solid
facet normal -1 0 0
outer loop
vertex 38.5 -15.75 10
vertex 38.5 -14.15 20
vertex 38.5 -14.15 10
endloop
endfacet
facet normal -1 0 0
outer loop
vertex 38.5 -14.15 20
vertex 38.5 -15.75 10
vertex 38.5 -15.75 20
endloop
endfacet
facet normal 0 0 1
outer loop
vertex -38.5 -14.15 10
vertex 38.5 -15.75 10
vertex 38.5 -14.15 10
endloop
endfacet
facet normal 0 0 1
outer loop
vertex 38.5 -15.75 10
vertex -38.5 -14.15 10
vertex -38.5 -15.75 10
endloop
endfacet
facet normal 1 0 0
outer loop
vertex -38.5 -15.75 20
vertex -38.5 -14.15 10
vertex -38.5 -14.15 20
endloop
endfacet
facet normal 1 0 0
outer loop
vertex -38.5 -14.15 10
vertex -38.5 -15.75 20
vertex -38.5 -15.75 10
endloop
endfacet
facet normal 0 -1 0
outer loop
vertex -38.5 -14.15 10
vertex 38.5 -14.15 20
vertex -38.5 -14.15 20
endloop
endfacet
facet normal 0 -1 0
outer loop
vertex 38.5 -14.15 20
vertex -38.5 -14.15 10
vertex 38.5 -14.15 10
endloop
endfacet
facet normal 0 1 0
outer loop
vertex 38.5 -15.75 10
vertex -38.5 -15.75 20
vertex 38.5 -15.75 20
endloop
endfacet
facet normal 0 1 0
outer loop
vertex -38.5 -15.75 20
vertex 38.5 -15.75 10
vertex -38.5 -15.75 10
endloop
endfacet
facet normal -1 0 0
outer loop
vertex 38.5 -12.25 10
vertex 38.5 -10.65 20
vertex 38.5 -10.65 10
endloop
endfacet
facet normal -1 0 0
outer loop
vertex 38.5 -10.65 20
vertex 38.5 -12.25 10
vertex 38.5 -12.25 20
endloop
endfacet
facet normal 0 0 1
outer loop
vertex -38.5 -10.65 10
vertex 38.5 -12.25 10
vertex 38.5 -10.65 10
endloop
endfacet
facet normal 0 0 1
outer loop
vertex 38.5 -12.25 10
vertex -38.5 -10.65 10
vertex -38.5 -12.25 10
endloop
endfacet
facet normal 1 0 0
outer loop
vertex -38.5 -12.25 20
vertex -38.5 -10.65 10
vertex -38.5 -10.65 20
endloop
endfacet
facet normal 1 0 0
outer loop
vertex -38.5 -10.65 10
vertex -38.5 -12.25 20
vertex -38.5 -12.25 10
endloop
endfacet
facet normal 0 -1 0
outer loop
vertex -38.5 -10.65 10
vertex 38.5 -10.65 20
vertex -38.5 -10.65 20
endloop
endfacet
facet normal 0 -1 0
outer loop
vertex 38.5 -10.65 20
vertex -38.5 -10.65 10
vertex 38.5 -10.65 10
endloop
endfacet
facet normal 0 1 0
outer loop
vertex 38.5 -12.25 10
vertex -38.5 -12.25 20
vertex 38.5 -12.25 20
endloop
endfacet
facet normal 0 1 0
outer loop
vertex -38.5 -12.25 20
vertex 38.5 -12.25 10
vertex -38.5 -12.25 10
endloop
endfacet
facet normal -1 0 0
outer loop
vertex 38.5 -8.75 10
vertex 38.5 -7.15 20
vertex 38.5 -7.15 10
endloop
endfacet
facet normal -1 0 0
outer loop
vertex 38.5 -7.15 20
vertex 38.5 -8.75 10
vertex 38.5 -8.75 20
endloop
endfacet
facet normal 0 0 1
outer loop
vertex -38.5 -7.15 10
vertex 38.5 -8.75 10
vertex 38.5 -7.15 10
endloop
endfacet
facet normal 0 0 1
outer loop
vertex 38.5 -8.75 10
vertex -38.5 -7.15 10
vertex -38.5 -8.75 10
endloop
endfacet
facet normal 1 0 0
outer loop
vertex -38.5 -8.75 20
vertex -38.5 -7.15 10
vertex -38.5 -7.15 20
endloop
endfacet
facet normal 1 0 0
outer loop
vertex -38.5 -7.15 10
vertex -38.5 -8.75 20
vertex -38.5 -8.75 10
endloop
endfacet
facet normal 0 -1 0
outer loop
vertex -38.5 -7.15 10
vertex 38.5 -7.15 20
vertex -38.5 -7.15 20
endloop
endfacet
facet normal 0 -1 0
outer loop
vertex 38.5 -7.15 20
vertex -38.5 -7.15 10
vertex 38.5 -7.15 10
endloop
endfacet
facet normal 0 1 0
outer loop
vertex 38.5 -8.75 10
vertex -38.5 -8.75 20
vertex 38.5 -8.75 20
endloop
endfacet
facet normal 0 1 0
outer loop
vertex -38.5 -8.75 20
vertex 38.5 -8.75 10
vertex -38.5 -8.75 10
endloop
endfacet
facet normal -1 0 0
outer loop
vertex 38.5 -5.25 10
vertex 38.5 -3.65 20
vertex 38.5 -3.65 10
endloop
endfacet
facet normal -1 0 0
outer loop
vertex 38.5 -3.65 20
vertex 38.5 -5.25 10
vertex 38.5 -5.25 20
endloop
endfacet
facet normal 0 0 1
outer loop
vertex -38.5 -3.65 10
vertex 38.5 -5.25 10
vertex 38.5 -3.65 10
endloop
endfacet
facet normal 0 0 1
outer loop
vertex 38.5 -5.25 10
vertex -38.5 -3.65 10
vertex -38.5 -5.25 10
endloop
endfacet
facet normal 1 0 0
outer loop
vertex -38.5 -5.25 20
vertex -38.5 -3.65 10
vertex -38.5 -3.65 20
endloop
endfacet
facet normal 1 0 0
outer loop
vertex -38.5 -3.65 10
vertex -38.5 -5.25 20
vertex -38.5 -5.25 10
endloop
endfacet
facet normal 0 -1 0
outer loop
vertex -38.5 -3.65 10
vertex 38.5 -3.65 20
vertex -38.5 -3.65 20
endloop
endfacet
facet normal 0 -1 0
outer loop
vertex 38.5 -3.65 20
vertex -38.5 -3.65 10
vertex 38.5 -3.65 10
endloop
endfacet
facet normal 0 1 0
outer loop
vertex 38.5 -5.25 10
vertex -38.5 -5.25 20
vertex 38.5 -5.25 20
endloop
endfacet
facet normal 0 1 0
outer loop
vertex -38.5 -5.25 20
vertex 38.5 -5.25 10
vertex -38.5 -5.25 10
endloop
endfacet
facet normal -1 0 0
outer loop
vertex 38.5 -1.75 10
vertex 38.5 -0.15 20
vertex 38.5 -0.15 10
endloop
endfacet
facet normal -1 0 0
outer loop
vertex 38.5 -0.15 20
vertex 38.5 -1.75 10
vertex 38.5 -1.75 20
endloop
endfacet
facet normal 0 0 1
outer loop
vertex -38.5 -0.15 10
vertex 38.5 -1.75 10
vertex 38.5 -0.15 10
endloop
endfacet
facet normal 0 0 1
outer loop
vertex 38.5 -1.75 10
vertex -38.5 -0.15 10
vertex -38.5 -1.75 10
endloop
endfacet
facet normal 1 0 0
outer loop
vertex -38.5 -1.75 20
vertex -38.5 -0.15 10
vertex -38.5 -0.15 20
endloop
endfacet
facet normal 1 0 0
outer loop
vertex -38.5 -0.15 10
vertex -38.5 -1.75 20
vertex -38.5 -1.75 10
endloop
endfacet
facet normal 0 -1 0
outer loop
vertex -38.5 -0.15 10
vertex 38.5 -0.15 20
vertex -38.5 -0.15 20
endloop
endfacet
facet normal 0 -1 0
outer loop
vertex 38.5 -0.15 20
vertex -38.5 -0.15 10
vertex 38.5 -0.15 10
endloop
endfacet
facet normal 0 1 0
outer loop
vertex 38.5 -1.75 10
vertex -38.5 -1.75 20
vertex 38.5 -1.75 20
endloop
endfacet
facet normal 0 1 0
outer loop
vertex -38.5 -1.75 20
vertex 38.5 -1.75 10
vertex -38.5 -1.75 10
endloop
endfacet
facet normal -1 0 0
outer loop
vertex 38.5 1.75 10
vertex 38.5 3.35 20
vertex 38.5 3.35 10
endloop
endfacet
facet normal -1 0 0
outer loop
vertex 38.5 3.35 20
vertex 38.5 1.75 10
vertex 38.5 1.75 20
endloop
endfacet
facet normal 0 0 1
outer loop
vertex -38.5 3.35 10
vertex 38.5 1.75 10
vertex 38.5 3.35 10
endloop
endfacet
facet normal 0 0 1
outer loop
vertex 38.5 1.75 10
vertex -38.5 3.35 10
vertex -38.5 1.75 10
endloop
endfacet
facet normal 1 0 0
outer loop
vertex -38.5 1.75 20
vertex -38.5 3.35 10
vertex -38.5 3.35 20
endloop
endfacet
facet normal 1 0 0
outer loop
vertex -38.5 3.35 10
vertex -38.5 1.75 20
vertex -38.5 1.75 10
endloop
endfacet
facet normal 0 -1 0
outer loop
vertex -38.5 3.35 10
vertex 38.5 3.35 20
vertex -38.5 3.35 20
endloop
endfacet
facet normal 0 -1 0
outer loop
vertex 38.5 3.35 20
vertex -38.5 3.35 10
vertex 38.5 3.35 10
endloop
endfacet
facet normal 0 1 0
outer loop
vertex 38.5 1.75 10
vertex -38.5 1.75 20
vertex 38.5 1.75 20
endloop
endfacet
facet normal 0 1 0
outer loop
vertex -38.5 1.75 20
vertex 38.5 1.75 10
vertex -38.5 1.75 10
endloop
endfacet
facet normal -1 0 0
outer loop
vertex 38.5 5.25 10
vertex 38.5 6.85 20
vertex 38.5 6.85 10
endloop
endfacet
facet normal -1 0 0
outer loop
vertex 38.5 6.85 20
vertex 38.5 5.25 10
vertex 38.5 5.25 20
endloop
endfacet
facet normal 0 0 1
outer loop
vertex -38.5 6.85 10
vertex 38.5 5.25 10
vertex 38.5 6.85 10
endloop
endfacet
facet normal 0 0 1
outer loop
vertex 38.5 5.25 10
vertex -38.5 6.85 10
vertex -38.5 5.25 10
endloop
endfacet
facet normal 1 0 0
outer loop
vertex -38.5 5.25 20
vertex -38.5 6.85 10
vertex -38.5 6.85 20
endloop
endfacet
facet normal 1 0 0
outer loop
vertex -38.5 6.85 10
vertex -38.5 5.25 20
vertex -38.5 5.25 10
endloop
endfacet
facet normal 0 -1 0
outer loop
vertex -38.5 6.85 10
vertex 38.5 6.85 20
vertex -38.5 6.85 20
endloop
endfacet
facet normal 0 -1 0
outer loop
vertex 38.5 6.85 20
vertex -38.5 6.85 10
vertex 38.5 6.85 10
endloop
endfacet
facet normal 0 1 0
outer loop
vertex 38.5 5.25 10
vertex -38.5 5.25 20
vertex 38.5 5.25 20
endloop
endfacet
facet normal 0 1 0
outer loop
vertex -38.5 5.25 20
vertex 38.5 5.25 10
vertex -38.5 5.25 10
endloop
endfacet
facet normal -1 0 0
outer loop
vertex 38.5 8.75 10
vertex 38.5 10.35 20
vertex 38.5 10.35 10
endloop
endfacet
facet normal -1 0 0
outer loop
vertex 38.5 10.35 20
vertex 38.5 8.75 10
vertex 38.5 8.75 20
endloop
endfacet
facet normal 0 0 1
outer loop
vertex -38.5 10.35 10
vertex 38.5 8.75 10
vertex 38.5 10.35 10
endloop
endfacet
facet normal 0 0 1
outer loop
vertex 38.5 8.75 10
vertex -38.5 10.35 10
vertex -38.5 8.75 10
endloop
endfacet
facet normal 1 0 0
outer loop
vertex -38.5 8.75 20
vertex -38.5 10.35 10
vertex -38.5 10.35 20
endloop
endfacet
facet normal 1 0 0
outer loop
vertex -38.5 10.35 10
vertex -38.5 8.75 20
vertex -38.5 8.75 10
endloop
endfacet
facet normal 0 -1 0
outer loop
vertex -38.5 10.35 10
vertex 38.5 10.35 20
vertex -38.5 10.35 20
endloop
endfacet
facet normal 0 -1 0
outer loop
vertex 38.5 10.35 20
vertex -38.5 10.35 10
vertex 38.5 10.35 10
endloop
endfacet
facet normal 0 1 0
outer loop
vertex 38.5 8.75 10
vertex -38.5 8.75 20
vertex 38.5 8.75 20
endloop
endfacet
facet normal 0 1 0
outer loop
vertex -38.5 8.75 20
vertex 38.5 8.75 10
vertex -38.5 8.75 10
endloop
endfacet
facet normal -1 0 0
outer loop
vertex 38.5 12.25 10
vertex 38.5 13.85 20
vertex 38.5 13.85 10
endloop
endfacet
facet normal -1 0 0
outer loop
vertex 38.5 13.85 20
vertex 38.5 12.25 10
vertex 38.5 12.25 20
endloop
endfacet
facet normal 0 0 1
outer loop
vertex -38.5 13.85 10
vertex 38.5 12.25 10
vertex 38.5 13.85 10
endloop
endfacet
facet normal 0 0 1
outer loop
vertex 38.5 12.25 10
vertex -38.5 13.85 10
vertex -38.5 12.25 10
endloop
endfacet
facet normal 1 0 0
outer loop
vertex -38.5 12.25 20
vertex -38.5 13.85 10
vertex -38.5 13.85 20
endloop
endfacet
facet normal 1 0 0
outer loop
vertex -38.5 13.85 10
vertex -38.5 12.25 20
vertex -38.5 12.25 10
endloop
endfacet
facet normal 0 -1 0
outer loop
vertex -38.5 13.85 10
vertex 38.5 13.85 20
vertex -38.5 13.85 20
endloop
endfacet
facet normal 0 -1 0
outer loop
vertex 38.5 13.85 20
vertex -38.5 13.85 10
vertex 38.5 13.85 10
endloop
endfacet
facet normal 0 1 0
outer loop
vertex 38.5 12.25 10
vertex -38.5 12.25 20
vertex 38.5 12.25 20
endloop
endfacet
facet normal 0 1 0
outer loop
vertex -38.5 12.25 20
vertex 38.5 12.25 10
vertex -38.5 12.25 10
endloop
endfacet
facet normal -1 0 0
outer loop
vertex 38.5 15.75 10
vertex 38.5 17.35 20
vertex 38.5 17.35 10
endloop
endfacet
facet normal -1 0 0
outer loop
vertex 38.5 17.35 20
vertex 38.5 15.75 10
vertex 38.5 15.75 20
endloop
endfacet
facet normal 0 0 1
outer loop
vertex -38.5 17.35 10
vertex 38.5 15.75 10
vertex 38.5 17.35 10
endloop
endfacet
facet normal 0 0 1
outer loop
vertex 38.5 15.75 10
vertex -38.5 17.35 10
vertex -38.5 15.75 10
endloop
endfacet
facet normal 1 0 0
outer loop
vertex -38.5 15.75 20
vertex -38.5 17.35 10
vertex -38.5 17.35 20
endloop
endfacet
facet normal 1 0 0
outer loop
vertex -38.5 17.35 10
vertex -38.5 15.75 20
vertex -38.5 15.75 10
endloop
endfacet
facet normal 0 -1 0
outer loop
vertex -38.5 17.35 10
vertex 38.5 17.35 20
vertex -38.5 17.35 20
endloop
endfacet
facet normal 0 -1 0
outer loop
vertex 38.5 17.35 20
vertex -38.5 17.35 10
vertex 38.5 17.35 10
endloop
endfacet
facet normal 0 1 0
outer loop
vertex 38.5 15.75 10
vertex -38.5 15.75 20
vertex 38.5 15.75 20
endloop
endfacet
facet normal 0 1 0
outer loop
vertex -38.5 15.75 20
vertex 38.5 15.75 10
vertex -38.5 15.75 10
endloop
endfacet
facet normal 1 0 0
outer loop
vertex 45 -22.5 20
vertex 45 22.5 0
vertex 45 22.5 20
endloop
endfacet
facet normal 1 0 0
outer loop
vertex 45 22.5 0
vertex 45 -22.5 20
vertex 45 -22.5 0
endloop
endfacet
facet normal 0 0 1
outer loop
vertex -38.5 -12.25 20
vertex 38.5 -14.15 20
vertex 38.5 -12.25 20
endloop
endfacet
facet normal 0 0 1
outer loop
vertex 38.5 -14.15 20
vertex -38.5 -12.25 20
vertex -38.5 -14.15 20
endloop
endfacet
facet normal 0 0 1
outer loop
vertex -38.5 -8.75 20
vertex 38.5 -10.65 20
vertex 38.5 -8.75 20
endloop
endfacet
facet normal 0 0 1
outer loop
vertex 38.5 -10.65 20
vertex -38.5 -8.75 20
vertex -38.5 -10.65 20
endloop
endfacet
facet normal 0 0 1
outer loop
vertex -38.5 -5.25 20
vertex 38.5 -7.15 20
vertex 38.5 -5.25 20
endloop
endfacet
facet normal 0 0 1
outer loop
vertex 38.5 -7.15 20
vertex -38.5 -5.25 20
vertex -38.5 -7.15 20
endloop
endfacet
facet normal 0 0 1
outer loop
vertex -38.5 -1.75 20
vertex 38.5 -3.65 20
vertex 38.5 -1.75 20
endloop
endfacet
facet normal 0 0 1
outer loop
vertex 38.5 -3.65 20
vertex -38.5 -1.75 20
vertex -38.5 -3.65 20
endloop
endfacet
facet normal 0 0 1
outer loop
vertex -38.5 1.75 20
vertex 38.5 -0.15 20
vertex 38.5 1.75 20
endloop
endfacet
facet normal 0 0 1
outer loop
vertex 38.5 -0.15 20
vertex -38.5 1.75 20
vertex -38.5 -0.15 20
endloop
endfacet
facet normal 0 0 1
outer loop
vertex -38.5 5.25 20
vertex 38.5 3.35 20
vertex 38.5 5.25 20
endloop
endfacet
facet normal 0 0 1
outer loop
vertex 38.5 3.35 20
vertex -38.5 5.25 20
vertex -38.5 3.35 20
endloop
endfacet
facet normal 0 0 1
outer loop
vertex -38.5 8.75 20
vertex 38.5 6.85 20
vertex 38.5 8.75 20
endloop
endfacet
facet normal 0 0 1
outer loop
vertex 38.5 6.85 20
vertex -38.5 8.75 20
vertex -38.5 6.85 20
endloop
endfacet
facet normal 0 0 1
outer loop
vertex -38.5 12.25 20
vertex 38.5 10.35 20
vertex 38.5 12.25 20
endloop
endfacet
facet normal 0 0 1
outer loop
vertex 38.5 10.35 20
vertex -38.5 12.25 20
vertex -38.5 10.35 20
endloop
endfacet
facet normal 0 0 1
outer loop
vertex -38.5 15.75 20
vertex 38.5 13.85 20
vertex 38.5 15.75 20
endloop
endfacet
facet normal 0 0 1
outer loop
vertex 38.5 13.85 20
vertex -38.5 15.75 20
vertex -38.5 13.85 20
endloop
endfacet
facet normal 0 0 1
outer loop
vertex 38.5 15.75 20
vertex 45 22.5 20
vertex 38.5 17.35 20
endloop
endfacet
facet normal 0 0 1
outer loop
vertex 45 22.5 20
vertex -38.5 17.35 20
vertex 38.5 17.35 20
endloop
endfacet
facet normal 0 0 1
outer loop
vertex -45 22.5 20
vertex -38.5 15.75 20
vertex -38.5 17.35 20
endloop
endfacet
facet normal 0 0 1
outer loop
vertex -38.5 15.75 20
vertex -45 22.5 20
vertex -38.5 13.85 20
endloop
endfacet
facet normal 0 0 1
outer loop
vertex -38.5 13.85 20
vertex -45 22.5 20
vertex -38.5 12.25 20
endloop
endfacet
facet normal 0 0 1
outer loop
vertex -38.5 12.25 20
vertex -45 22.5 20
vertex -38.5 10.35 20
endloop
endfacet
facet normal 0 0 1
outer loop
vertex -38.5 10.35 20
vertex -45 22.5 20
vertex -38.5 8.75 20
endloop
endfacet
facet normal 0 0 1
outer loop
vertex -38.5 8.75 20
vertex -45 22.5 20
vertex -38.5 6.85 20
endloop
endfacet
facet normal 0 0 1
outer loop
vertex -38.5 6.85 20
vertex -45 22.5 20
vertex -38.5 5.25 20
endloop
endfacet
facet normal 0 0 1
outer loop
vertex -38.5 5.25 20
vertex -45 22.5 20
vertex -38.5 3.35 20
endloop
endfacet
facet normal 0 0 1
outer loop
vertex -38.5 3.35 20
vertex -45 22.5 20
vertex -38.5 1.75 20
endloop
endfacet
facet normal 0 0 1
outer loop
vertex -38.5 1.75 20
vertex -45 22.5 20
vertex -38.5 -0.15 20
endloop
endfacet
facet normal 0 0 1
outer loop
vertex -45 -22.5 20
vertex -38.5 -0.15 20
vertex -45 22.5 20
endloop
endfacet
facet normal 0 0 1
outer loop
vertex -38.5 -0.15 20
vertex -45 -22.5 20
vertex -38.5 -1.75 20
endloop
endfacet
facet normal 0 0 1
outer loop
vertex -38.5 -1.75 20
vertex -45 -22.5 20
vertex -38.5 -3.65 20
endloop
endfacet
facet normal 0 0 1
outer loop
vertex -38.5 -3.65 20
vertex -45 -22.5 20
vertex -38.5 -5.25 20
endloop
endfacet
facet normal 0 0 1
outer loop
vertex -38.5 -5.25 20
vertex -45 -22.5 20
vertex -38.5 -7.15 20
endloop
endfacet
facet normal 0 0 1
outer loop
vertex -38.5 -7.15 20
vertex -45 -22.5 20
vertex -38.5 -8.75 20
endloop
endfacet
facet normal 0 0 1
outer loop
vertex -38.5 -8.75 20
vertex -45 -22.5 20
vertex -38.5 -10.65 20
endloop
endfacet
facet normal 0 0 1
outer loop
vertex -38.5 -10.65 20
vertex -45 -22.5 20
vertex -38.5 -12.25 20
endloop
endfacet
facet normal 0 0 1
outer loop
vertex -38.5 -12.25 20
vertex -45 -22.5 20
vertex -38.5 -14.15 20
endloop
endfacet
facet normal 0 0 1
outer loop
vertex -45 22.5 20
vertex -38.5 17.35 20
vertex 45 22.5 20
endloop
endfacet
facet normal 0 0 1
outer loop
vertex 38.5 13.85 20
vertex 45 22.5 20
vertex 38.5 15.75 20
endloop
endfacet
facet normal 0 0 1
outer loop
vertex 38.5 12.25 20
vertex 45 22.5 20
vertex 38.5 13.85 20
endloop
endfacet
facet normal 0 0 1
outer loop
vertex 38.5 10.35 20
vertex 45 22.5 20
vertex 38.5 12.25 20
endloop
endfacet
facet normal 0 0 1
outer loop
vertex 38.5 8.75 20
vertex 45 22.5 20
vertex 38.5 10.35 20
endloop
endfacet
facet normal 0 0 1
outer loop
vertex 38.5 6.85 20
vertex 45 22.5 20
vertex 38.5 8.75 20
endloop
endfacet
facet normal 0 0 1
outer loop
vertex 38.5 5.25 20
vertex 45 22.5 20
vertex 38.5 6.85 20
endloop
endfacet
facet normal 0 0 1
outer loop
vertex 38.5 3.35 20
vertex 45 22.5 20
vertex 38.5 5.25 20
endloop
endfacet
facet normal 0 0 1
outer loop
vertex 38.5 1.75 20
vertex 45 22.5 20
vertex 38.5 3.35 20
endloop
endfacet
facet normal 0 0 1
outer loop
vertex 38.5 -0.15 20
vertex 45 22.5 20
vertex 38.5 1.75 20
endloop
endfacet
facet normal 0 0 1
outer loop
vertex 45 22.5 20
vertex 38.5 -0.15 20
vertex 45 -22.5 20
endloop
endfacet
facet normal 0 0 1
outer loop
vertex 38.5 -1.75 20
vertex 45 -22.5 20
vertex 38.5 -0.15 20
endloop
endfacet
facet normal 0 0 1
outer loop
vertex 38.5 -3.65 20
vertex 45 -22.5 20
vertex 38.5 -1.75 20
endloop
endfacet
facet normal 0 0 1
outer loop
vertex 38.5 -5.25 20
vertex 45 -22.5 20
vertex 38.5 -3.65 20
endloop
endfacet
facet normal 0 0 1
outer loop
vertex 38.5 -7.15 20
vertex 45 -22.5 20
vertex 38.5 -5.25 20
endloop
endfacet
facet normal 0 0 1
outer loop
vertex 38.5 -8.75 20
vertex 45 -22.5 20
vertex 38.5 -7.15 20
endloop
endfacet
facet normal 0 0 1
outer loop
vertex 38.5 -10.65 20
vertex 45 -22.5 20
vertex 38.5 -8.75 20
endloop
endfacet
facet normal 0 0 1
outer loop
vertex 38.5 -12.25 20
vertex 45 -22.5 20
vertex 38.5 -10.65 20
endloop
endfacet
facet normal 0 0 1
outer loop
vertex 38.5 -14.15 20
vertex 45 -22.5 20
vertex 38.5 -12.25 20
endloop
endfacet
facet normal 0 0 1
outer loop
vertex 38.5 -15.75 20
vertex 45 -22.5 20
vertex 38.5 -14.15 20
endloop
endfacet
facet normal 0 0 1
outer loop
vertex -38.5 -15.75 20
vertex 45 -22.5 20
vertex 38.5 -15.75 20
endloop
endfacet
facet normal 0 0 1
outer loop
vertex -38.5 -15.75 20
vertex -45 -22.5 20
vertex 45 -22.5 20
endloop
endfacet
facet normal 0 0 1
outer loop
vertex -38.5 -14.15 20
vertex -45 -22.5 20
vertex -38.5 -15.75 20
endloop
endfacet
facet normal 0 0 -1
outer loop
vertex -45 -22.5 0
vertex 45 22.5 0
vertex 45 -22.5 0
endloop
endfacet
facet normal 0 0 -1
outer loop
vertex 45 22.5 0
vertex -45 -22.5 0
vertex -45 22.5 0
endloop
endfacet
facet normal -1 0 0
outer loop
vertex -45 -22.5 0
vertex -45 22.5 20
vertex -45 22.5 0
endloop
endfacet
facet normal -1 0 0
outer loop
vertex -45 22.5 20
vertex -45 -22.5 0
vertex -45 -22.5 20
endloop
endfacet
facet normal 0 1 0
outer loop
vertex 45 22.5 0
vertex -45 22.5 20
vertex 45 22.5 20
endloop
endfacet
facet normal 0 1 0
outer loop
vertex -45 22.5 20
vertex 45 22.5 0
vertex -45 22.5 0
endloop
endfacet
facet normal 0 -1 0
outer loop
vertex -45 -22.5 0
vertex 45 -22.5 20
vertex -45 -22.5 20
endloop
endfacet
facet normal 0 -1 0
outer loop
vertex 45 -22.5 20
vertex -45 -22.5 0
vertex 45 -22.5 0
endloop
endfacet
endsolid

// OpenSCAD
// Microscope slide drying rack
// Print orientation: base on XY plane, slots open upward (+Z)

// ---------- Parameters ----------
block_len   = 90;    // block length along X (mm)
block_wid   = 45;    // block width along Y (mm)
block_ht    = 20;    // block height along Z (mm)

slot_count  = 10;    // number of slide slots
slot_len    = 77;    // slot length along X (mm)
slot_wid    = 1.6;   // slot width along Y (mm)
slot_depth  = 10;    // slot depth from top face (mm)
slot_pitch  = 3.5;   // centre-to-centre slot spacing in Y (mm)

eps         = 0.5;   // overcut past faces to avoid coplanar surfaces (mm)

$fn = 64;

// ---------- Derived ----------
slot_x0 = -(slot_len / 2);          // first slot start in X
slot_y0 = -(slot_count - 1) * slot_pitch / 2;  // first slot centre in Y

// ---------- Model ----------
difference() {
    // Base block
    translate([-block_len / 2, -block_wid / 2, 0])
        cube([block_len, block_wid, block_ht]);

    // Parallel slots, open at the top
    for (i = [0 : slot_count - 1]) {
        translate([slot_x0, slot_y0 + i * slot_pitch, block_ht - slot_depth])
            cube([slot_len, slot_wid, slot_depth + eps]);
    }
}
